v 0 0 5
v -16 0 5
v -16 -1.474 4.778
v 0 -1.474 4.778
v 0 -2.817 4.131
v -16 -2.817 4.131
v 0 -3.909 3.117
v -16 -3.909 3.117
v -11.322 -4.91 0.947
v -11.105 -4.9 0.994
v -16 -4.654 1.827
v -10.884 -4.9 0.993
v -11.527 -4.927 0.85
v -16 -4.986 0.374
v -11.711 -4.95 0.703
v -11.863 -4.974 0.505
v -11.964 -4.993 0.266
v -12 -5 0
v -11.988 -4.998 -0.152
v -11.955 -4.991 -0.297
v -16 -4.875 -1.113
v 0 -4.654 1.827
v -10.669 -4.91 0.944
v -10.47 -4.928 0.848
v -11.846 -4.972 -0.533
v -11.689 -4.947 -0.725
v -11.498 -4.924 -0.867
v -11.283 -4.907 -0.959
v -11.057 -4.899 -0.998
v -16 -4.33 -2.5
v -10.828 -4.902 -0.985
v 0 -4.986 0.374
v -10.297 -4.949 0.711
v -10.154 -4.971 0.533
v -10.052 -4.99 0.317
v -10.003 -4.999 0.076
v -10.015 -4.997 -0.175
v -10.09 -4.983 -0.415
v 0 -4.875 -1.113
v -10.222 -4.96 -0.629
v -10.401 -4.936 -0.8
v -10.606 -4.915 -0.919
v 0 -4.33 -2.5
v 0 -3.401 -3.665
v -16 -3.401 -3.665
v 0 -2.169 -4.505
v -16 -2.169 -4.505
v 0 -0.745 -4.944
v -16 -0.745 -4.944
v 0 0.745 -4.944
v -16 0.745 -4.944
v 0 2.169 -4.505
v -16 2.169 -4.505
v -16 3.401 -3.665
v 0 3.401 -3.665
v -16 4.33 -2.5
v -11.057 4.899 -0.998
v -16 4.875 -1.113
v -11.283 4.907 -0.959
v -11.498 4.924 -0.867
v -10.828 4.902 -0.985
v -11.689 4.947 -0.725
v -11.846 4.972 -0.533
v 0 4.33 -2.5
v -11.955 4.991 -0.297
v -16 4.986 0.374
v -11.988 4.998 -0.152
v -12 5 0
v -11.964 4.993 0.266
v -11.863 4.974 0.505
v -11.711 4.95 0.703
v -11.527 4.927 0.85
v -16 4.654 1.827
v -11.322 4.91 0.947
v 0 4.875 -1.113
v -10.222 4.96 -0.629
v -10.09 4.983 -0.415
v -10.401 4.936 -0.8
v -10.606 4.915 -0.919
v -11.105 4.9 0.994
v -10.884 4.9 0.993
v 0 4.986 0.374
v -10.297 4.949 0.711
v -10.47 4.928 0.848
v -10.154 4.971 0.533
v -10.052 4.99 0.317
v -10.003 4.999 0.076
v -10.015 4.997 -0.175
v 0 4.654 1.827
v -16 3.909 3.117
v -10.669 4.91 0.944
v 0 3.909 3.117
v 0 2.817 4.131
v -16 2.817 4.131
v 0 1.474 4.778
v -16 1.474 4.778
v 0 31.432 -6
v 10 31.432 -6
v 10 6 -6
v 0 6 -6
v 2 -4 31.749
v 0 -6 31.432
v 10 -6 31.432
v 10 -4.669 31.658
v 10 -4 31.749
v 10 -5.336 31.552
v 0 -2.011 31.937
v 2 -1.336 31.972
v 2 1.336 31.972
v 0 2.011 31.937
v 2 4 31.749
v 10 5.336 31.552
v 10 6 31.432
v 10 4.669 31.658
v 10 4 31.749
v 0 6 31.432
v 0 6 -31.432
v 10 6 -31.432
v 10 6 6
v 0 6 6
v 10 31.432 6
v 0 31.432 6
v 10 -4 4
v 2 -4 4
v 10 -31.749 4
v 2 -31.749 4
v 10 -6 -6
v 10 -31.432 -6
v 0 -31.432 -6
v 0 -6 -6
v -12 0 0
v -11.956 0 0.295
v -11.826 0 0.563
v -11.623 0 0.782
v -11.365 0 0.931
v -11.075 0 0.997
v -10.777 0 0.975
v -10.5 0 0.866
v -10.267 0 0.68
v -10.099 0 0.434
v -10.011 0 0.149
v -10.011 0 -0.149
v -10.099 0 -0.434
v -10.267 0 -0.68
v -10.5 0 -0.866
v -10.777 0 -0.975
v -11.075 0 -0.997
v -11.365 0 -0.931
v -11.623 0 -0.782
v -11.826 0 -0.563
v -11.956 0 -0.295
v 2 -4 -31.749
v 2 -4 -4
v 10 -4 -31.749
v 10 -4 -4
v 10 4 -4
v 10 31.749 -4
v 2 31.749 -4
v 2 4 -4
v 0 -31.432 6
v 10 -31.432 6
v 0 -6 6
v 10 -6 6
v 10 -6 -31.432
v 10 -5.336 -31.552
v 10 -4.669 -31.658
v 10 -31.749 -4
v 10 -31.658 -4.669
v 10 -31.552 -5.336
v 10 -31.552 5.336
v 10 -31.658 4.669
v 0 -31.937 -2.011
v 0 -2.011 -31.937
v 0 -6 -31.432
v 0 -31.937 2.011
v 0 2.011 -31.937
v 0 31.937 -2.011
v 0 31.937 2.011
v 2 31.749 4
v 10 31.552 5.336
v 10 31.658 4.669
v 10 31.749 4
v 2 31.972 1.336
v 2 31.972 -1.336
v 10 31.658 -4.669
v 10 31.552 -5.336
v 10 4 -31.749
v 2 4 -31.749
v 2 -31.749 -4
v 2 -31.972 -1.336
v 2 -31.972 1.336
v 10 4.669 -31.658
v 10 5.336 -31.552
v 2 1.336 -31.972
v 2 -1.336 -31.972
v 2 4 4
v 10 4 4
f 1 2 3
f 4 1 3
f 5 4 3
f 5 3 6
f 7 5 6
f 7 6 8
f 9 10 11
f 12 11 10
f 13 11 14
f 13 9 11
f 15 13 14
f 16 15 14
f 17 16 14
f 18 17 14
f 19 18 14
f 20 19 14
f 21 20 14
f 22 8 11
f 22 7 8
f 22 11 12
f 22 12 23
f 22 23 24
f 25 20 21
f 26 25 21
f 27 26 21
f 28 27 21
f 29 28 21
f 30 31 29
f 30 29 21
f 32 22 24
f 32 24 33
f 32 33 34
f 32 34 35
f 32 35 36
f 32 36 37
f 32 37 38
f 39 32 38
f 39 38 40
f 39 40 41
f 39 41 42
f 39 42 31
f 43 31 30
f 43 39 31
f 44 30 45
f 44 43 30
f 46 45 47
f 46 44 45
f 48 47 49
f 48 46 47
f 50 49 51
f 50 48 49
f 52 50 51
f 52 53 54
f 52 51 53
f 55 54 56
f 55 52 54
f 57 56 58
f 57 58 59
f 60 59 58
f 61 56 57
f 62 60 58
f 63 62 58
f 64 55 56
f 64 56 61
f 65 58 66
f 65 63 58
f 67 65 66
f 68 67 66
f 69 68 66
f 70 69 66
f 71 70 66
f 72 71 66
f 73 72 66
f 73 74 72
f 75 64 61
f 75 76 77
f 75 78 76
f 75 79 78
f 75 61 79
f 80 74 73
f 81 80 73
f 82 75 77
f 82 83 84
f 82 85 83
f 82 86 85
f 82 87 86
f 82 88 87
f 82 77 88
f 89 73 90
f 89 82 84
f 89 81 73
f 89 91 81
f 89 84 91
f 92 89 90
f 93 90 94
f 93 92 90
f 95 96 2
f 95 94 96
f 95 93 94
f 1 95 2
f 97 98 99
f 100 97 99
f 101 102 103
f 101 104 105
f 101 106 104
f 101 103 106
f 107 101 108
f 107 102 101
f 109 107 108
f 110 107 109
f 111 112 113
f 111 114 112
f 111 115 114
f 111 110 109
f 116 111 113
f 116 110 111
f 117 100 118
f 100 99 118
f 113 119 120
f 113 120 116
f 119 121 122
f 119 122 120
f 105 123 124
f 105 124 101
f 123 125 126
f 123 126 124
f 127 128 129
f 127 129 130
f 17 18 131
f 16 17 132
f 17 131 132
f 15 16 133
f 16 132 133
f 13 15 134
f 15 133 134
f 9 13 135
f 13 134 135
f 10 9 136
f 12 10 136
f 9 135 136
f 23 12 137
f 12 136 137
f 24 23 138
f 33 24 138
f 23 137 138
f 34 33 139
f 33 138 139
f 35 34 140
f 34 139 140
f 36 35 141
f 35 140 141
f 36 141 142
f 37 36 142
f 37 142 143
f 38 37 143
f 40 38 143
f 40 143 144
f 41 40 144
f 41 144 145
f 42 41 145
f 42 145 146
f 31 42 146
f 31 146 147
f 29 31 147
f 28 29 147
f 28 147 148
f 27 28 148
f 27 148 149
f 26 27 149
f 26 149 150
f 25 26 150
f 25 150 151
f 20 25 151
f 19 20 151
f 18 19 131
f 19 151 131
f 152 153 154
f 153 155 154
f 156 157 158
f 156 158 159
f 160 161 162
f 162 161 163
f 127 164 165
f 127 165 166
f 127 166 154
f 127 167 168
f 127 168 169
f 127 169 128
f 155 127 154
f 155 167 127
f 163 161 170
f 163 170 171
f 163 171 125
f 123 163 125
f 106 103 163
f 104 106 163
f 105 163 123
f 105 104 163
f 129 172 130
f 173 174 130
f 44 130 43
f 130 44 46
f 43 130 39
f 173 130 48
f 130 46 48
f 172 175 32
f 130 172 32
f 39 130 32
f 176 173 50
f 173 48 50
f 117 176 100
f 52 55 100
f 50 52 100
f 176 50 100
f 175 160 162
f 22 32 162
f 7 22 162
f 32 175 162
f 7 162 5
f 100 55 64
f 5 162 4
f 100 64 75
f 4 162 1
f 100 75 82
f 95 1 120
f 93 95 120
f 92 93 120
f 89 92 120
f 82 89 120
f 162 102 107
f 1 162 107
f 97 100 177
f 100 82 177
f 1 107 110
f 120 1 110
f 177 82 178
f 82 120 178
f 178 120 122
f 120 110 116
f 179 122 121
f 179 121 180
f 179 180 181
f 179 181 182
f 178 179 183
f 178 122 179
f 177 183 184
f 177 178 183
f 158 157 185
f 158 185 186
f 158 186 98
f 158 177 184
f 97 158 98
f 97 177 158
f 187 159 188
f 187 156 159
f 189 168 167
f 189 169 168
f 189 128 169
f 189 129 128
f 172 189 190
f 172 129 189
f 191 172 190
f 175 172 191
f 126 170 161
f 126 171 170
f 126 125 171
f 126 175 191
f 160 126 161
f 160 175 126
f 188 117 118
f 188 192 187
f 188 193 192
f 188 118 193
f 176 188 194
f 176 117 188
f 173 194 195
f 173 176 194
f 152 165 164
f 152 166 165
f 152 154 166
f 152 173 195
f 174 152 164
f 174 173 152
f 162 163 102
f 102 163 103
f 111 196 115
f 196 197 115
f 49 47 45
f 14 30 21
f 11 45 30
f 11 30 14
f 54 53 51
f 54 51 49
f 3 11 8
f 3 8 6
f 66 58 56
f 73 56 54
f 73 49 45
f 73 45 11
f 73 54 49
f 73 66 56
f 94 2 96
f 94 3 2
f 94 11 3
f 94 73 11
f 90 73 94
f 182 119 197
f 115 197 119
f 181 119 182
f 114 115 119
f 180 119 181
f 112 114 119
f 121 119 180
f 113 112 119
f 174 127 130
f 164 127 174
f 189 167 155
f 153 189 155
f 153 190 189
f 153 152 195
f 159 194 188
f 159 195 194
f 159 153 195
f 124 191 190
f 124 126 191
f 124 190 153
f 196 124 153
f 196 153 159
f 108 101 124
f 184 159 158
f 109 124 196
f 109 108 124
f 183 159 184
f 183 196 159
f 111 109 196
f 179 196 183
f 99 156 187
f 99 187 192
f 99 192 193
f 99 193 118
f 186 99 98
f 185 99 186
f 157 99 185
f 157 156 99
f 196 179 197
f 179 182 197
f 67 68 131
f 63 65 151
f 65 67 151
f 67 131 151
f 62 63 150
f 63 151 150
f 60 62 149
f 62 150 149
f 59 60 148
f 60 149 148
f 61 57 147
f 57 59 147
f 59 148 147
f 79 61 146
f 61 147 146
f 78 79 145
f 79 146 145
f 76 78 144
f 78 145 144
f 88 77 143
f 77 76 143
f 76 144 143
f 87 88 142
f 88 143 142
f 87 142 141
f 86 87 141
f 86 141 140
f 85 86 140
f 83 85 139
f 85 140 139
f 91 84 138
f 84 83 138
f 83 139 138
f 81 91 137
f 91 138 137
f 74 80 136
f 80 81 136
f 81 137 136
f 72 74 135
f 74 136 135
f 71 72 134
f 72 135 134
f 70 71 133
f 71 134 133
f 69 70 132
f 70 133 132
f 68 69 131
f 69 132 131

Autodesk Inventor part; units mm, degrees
ref_plane "YZ Plane" through (0, 0, 0) normal (1, 0, 0) x (0, 1, 0)
ref_plane "XZ Plane" through (0, 0, 0) normal (0, 1, 0) x (-1, 0, 0)
ref_plane "XY Plane" through (0, 0, 0) normal (0, 0, 1) x (1, 0, 0)
sketch "Sketch1" plane through (0, 0, 0) normal (1, 0, 0) x (0, 1, 0)
  circle A0 centre (0, 0) radius 32
  dimension "d0" = 64
extrude "Extrusion1" add sketch "Sketch1" along normal blind 10
sketch "Sketch2" plane through (10, 0, 0) normal (1, 0, 0) x (0, 0, -1)
  circle A0 centre (0, 0) radius 32 projected
  line L0 (-6, 33.1057) -> (-6, 6)
  line L1 (-6, 6) -> (-33.1057, 6)
  line L2 (0, 0) -> (-11.4167, 0)
  line L3 (0, 0) -> (0, 10.4167)
  arc A1 (-6, 33.1057) -> (-33.1057, 6) centre (-1.4332, 1.4332) ccw
  line L4 (-6, -33.1057) -> (-6, -6)
  line L5 (-6, -6) -> (-33.1057, -6)
  arc A2 (-33.1057, -6) -> (-6, -33.1057) centre (-1.4332, -1.4332) ccw
  line L6 (6, 33.1057) -> (6, 6)
  line L7 (6, 6) -> (33.1057, 6)
  arc A3 (33.1057, 6) -> (6, 33.1057) centre (1.4332, 1.4332) ccw
  arc A4 (6, -33.1057) -> (33.1057, -6) centre (1.4332, -1.4332) ccw
  line L8 (6, -33.1057) -> (6, -6)
  line L9 (6, -6) -> (33.1057, -6)
  dimension "d3" = 12
  dimension "d4" = 12
extrude "Extrusion2" cut sketch "Sketch2" against normal blind 10 contours L7 L6 A0 | A0 L6 A3 L7 | L9 A4 L8 A0 | A0 L8 L9 | L0 L1 A0 | A0 L1 A1 L0 | L4 A2 L5 A0 | A0 L5 L4
shell "Shell1" thickness 2 removed faces 5 at (6.6667, 31.8245, -3.347) at (10, -0.6702, -14.6456) at (6.6667, 0.6706, -31.993) at (6.6667, -31.993, -0.6706) at (6.6667, -0.6706, 31.993)
sketch "Sketch3" plane through (0, 0, 0) normal (-1, 0, 0) x (0, 0, 1)
  arc A0 (-31.4325, 6) -> (-31.4325, -6) centre (0, 0) ccw projected
  circle A1 centre (0, 0) radius 5
  dimension "d9" = 10
extrude "Extrusion3" add sketch "Sketch3" along normal blind 16
sketch "Sketch4" plane through (0, 0, 0) normal (0, 1, 0) x (-1, 0, 0)
  circle A0 centre (11, 0) radius 1
  line L0 (16, -5) -> (16, 5) projected
  point P0 (0, 0)
  dimension "d12" = 2
  dimension "d13" = 5
extrude "Extrusion4" cut sketch "Sketch4" along normal mid plane 16
properties part number "Cross"
